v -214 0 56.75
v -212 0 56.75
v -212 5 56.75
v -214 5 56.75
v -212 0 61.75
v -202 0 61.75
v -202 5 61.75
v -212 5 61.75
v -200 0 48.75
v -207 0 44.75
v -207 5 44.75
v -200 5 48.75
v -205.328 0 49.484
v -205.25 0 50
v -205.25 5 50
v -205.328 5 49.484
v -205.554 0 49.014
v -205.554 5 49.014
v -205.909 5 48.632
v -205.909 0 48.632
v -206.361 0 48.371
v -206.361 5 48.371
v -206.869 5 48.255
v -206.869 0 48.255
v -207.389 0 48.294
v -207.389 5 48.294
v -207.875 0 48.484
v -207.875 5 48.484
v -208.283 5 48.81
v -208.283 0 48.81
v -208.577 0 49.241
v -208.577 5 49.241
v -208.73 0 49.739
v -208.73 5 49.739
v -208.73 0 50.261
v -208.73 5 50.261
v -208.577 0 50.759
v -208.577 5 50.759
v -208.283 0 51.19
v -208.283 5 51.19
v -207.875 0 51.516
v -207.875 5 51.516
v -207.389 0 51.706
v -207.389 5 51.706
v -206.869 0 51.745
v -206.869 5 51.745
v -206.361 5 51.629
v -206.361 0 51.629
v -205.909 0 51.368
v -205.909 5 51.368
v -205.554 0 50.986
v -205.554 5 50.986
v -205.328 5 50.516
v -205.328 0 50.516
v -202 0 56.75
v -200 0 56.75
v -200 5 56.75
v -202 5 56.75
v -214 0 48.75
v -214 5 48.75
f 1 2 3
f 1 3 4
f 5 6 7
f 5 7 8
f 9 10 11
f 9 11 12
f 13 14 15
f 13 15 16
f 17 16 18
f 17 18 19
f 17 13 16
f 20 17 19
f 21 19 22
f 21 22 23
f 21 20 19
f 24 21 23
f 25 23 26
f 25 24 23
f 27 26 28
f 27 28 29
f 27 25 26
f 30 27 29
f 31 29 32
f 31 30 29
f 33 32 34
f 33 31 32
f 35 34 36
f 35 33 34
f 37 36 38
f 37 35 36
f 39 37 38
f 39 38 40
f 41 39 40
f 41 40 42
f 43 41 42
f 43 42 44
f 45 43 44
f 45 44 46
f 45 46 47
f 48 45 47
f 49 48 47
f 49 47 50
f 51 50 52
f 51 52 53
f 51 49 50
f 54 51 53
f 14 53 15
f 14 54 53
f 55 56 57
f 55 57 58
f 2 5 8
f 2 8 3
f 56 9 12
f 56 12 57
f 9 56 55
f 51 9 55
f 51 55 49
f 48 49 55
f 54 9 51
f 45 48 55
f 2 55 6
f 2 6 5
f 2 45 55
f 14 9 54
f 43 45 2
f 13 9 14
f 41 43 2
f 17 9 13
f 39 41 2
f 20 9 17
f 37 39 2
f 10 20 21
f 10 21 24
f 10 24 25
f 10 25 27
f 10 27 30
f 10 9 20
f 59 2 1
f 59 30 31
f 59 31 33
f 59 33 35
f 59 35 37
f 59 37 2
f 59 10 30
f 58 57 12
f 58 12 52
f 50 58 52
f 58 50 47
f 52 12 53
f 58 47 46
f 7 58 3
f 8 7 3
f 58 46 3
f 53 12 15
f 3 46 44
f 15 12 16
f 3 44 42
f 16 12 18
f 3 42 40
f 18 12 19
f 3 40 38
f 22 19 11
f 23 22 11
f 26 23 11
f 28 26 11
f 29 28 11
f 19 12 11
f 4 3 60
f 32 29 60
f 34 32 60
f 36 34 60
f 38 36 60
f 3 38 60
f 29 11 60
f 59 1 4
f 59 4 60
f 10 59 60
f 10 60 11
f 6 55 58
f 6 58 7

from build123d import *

# Parameters (mm, degrees)
SKETCH2_R           = 1.75
BOSS_EXTRUDE3_DEPTH = 5


with BuildPart() as part:
    # Sketch2 → Boss-Extrude3 (new body)
    with BuildSketch(Plane(origin=(0, 0, 0), x_dir=(1, 0, 0), z_dir=(0, 1, 0))):
        Polygon((-214, -48.75), (-207, -44.75), (-200, -48.75), (-200, -56.75), (-202, -56.75), (-202, -61.75), (-212, -61.75), (-212, -56.75), (-214, -56.75), align=None)
        with Locations((-207, -50)):
            Circle(SKETCH2_R, mode=Mode.SUBTRACT)
    extrude(amount=BOSS_EXTRUDE3_DEPTH)


solid = part.part
